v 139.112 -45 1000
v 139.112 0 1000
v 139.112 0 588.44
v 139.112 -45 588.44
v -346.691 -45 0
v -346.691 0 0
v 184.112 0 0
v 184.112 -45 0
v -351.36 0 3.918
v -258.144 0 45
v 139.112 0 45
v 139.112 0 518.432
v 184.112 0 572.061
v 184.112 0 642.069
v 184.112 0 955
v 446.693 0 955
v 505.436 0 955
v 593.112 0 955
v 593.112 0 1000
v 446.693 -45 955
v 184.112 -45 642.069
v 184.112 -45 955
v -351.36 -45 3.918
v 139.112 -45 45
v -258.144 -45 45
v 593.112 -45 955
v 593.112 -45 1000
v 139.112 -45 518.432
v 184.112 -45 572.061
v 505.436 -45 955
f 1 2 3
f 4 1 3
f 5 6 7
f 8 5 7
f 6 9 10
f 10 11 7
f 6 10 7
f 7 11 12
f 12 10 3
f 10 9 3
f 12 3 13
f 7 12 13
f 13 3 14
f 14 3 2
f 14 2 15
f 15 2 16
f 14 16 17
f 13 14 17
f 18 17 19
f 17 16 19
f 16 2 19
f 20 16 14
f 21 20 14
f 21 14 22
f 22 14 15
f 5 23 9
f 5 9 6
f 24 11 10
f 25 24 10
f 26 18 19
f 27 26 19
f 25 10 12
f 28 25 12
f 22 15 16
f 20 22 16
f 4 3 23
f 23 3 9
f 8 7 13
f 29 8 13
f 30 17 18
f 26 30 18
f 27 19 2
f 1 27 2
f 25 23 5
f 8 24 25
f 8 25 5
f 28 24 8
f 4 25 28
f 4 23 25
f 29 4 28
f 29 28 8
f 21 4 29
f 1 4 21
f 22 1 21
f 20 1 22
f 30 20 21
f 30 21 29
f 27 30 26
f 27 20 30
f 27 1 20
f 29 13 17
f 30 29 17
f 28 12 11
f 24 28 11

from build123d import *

# Parameters (mm, degrees)
F0_W     = 45
F0_H     = 45
F1_DEPTH = 45


with BuildPart() as f1:
    # F0 (on Front) → F1 (new body)
    with BuildSketch(Plane.XZ):
        Polygon((139.1122582526, 518.4320460093), (139.1122582526, 588.439618218), (-316.8877249613, 45), (-258.1443969413, 45), align=None)
        Polygon((-258.1443969413, 45), (-316.8877249613, 45), (-351.3597249985, 3.9178701118), (-346.6905892175, 0), (-295.9038803443, 0), align=None)
        Polygon((139.1122582526, 0), (139.1122582526, 45), (-258.1443969413, 45), (-295.9038803443, 0), align=None)
        with Locations((161.6122582526, 22.5)):
            Rectangle(F0_W, F0_H)
        Polygon((184.1122582526, 45), (184.1122582526, 572.060957676), (139.1122582526, 518.4320460093), (139.1122582526, 45), align=None)
        Polygon((184.1122582526, 600), (148.8125703421, 600), (139.1122582526, 588.439618218), (139.1122582526, 518.4320460093), (184.1122582526, 572.060957676), align=None)
        Polygon((184.1122582526, 642.0685298847), (184.1122582526, 600), (184.1122582526, 572.060957676), (505.43626743, 955), (446.6929394101, 955), align=None)
        with Locations((161.6122582526, 977.5)):
            Rectangle(F0_W, F0_H)
        Polygon((184.1122582526, 1000), (184.1122582526, 955), (446.6929394101, 955), (484.264167594, 999.7756461664), (518.7361675344, 970.8502037305), (505.43626743, 955), (593.1122582526, 955), (593.1122582526, 1000), align=None)
        Polygon((139.1122582526, 588.439618218), (148.8125703421, 600), (184.1122582526, 642.0685298847), (184.1122582526, 955), (139.1122582526, 955), align=None)
        Polygon((484.264167594, 999.7756461664), (446.6929394101, 955), (505.43626743, 955), (518.7361675344, 970.8502037305), align=None)
        Polygon((184.1122582526, 642.0685298847), (148.8125703421, 600), (184.1122582526, 600), align=None)
    extrude(amount=F1_DEPTH)


solid = f1.part
